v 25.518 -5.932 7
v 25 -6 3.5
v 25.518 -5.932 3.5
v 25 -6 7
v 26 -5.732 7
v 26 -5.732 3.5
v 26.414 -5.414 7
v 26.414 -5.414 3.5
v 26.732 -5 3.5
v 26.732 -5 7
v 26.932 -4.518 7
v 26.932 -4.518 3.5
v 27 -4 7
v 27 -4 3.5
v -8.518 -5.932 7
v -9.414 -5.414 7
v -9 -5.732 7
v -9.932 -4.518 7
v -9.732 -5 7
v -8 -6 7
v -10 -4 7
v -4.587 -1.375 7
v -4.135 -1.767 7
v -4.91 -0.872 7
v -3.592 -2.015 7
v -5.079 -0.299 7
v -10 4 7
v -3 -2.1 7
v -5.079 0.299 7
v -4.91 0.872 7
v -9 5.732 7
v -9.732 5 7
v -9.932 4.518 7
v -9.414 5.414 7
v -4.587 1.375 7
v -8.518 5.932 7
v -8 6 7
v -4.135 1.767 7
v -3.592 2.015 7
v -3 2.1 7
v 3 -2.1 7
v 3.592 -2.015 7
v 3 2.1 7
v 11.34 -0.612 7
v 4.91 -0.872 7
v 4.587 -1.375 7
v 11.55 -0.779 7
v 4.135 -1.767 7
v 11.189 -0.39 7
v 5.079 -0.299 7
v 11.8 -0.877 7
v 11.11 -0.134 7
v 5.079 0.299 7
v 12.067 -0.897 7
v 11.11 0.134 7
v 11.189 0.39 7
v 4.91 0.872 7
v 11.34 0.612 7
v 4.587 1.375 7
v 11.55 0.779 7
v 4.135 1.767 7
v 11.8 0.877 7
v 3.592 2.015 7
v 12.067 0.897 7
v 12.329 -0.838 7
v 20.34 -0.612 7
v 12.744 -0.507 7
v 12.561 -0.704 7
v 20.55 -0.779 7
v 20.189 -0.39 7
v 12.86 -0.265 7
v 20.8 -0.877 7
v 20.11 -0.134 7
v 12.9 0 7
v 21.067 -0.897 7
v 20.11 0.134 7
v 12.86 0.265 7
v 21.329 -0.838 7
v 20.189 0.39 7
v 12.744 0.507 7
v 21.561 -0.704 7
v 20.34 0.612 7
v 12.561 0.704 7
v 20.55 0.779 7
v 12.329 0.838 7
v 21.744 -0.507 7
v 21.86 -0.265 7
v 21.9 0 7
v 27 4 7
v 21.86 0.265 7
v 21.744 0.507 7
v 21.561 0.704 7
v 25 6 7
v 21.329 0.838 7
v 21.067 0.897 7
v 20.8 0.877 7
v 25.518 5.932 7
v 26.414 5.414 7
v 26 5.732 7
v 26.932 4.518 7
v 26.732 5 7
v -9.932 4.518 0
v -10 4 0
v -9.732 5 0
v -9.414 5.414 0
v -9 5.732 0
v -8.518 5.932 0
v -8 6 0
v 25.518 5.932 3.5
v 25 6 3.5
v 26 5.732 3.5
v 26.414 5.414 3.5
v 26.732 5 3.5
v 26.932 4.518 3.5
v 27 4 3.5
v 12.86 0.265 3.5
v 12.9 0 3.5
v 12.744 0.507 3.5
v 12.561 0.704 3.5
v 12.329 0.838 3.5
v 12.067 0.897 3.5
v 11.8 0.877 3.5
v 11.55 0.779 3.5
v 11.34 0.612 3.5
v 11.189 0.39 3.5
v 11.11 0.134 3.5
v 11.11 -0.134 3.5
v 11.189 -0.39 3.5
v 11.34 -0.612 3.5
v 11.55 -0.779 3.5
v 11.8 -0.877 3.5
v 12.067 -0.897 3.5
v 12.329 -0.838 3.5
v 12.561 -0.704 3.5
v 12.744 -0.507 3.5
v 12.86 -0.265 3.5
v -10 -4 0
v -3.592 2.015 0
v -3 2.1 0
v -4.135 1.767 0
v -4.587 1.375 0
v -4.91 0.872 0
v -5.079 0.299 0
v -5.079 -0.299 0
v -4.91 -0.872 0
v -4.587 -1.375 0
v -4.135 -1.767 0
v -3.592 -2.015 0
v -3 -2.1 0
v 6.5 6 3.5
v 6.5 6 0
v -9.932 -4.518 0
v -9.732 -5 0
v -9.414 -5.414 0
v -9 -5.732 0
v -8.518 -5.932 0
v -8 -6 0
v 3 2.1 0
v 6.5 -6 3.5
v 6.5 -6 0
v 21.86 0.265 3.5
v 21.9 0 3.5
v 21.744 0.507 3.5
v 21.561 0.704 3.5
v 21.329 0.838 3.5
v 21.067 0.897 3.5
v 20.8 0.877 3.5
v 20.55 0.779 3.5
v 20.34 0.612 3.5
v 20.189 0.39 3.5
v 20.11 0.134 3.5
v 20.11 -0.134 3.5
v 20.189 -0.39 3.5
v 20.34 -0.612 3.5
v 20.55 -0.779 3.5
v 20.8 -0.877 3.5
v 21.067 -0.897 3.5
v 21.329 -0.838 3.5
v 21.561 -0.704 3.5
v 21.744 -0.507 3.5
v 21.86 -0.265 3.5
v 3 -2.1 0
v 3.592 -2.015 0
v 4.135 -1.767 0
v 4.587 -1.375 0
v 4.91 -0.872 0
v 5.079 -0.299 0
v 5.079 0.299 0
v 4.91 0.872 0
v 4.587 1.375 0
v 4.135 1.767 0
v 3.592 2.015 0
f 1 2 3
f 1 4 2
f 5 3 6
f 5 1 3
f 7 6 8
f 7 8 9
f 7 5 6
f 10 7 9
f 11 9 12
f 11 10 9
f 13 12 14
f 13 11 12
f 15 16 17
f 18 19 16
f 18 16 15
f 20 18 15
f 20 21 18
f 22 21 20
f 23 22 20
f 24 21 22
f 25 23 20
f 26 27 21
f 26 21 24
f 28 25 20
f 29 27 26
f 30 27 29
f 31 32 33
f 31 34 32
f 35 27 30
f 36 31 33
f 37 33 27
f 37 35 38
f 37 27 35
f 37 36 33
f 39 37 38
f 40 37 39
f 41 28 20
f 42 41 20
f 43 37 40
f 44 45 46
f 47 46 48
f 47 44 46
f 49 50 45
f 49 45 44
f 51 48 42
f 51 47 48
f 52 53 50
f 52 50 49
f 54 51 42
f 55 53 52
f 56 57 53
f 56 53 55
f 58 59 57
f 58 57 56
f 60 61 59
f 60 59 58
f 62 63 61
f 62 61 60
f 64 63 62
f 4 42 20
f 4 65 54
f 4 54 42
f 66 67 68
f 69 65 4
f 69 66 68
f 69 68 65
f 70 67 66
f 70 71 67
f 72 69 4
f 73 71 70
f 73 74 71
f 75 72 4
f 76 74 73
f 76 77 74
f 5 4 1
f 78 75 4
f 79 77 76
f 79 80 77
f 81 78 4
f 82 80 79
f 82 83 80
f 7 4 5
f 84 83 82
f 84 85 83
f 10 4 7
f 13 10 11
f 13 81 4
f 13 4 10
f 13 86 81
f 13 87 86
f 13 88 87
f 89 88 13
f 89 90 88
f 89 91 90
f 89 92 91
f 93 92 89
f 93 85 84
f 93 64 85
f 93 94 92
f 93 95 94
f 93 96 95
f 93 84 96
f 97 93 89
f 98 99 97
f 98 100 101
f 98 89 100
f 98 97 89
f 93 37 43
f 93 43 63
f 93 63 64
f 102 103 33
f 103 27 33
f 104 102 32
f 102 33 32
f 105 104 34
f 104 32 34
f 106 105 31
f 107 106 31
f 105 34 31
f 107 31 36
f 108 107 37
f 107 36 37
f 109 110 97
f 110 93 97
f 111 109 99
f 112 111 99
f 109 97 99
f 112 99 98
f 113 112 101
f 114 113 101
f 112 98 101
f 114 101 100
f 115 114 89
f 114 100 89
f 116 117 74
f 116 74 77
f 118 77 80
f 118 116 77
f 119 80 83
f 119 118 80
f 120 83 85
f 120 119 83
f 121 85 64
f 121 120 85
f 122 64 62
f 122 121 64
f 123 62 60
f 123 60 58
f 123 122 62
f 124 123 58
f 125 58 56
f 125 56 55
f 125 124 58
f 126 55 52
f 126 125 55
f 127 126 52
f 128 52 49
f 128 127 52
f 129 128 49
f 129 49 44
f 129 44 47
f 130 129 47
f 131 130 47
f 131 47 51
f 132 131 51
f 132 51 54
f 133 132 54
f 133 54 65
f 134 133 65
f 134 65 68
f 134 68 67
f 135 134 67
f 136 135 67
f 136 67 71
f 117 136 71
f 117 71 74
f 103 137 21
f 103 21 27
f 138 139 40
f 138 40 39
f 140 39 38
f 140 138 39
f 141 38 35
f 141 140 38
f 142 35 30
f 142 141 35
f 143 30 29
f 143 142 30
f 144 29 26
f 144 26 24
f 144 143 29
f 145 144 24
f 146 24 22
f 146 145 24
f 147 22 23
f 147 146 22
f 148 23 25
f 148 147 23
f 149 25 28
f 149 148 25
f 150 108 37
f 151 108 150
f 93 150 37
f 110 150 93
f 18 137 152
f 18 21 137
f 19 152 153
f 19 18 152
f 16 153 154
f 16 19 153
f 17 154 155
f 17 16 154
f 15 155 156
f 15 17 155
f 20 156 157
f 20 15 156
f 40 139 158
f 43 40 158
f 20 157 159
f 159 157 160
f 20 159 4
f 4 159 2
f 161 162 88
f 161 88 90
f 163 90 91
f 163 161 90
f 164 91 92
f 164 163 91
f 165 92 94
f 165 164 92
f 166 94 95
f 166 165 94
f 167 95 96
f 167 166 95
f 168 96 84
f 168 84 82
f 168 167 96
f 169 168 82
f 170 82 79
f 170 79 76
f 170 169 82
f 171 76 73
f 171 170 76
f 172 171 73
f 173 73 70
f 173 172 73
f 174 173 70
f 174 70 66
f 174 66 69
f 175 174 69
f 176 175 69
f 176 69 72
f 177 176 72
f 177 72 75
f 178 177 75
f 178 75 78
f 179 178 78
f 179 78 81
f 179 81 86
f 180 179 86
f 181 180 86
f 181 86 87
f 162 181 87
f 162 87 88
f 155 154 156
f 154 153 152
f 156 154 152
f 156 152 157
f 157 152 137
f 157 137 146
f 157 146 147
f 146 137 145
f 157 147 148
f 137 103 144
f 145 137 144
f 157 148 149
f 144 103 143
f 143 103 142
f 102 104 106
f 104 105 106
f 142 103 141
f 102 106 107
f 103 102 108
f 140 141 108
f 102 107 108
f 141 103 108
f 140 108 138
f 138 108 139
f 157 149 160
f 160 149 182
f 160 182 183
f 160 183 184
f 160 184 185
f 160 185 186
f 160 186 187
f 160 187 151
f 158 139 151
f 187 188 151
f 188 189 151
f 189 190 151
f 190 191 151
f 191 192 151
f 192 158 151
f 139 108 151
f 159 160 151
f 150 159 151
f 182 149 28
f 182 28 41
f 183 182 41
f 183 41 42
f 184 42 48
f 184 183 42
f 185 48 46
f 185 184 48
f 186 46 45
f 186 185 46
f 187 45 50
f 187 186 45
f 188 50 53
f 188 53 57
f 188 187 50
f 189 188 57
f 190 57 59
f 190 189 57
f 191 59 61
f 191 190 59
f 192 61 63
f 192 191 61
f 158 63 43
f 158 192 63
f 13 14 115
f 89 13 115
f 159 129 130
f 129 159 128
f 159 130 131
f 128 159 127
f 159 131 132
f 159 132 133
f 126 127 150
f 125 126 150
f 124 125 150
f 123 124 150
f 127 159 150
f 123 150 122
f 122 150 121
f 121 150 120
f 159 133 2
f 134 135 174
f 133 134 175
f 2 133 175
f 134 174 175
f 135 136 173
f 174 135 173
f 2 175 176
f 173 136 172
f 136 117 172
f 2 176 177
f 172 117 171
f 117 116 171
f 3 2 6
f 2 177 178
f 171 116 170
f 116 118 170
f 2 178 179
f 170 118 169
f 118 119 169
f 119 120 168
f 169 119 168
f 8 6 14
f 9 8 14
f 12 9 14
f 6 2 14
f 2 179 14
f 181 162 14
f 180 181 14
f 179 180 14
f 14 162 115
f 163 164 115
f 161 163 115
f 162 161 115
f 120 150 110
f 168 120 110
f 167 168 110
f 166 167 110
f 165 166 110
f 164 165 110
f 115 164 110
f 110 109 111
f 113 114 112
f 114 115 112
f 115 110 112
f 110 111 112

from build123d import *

# Parameters (mm, degrees)
SKETCH_W     = 37
SKETCH_H     = 12
SKETCH_R     = 0.9
PAD_DEPTH    = 7
SKETCH001_W  = 20.5
SKETCH001_H  = 12
POCKET_DEPTH = 3.5
FILLET_R     = 2


with BuildPart() as part:
    # Sketch → Pad (new body)
    with BuildSketch(Plane.XY):
        with Locations((8.5, 0)):
            Rectangle(SKETCH_W, SKETCH_H)
        with Locations((12, 0)):
            Circle(SKETCH_R, mode=Mode.SUBTRACT)
        with Locations((21, 0)):
            Circle(SKETCH_R, mode=Mode.SUBTRACT)
        with BuildLine():
            ThreePointArc((-3, 2.1), (-5.1, 0), (-3, -2.1))
            Line((-3, -2.1), (3, -2.1))
            ThreePointArc((3, -2.1), (5.1, 0), (3, 2.1))
            Line((-3, 2.1), (3, 2.1))
        make_face(mode=Mode.SUBTRACT)
    extrude(amount=PAD_DEPTH)

    # Sketch001 → Pocket (cut)
    with BuildSketch(Plane.XY):
        with Locations((16.75, 0)):
            Rectangle(SKETCH001_W, SKETCH001_H)
    extrude(amount=POCKET_DEPTH, mode=Mode.SUBTRACT)

    # Fillet
    fillet_edges = [part.edges().sort_by_distance(p)[0] for p in [
        (27, 6, 5.25),
        (27, -6, 5.25),
        (-10, -6, 3.5),
        (-10, 6, 3.5),
    ]]
    fillet(fillet_edges, radius=FILLET_R)


solid = part.part
